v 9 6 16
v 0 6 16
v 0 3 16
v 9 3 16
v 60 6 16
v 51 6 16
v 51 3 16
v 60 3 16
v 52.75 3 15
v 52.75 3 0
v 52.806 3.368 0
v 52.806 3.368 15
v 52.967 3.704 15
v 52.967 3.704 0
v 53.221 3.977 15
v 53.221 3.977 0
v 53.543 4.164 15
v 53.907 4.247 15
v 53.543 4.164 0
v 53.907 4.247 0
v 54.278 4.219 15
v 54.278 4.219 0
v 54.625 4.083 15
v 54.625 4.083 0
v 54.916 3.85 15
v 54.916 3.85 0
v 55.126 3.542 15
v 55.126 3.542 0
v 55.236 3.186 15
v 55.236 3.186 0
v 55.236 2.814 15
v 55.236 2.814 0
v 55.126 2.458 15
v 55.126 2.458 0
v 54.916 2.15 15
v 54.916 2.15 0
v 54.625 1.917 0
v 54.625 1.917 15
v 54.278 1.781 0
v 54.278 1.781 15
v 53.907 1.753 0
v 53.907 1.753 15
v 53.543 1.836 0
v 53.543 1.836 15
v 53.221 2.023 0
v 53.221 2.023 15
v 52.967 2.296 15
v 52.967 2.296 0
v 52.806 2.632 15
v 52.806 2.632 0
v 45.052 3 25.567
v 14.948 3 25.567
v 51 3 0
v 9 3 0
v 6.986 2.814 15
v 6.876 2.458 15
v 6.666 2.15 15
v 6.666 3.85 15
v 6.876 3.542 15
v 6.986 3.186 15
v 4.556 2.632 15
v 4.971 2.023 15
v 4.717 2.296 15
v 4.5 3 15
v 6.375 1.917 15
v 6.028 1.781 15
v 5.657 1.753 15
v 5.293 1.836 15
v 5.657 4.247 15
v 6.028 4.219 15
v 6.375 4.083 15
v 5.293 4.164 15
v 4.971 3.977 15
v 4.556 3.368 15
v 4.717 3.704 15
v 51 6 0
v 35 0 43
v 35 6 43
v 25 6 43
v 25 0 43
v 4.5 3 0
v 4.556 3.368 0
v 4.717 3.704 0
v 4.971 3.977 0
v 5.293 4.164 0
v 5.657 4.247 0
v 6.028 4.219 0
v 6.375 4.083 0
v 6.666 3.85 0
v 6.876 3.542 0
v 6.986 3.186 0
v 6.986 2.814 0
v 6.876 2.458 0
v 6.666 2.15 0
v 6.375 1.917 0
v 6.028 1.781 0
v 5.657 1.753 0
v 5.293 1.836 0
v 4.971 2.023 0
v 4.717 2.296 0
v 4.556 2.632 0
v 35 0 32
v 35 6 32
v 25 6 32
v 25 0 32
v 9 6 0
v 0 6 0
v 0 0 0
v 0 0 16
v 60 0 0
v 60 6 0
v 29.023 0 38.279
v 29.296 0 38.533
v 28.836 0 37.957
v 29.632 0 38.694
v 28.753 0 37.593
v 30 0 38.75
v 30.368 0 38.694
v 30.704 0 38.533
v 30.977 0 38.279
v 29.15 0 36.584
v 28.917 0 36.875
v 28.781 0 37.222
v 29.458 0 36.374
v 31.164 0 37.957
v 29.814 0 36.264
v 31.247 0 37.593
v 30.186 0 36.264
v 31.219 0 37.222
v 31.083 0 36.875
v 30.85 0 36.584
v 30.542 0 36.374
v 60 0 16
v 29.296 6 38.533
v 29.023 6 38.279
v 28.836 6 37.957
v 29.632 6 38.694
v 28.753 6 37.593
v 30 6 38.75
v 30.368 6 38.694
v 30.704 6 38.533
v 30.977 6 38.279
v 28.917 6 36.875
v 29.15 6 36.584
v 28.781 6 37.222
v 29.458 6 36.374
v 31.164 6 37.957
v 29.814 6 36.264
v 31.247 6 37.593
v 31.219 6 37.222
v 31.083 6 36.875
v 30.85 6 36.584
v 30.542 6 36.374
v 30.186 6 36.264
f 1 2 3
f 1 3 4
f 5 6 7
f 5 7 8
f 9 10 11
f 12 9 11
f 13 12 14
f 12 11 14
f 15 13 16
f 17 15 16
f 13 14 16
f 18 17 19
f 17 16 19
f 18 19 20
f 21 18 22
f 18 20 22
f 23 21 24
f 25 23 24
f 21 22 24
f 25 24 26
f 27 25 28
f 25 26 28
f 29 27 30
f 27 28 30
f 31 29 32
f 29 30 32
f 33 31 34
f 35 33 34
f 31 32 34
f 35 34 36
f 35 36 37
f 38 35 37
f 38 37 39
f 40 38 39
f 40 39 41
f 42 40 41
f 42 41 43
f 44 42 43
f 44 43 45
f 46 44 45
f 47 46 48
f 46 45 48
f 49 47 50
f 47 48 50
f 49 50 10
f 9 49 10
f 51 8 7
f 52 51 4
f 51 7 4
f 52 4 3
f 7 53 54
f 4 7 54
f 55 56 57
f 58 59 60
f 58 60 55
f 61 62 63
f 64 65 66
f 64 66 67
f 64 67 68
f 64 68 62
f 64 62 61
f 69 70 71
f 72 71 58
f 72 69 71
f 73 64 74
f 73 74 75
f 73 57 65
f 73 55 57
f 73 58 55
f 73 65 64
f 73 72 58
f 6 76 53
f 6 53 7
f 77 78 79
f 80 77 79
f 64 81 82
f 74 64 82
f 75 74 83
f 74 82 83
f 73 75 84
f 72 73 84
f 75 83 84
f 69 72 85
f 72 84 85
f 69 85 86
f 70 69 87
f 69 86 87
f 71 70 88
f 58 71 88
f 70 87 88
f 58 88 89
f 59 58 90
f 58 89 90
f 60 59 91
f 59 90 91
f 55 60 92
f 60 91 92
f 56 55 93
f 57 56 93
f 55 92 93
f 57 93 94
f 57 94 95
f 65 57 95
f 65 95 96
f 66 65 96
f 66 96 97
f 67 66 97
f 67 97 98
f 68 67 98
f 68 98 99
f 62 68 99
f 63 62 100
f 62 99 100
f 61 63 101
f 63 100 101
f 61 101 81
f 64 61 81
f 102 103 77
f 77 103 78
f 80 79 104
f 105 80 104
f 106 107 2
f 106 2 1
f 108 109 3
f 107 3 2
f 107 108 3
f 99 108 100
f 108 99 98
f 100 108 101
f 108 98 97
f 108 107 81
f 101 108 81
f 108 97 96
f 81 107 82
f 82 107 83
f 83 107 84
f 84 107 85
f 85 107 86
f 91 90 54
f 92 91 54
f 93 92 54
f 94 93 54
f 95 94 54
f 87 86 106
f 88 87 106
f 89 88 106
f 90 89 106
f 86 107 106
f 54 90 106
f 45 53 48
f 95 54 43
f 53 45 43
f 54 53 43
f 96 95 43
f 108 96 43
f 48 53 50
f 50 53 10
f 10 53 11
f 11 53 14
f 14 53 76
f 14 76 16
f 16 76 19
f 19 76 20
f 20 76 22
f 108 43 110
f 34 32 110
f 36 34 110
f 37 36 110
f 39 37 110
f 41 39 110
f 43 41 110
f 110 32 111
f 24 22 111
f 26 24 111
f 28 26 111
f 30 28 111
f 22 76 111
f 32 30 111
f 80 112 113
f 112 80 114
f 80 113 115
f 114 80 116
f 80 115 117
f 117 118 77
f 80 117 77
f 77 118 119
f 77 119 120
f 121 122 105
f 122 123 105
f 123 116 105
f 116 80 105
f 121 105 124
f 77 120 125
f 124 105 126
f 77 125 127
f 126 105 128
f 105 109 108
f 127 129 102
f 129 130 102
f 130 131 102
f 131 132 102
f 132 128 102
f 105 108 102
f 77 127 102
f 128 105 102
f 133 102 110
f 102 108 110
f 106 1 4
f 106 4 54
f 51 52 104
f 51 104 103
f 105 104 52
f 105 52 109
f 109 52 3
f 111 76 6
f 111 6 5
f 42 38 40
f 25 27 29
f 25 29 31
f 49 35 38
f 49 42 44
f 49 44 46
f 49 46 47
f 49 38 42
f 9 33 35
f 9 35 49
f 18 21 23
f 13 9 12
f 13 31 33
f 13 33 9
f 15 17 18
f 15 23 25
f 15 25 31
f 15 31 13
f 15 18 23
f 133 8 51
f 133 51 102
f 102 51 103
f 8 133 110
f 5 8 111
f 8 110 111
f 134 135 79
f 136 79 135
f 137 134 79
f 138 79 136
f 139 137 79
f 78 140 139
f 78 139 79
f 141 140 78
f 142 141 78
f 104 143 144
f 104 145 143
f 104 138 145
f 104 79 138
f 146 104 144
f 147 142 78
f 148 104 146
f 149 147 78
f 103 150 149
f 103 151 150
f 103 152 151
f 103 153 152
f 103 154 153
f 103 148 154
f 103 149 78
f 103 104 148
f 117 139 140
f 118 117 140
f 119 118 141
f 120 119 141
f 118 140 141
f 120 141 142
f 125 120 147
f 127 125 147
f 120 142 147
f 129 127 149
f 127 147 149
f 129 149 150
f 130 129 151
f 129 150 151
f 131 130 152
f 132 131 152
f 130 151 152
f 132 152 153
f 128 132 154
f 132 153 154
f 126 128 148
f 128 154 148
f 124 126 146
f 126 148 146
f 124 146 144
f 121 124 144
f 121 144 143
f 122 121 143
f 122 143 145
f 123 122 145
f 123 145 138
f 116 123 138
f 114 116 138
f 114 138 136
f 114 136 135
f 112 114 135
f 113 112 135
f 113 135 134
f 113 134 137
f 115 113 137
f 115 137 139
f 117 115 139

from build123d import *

# Parameters (mm, degrees)
ESQUISSE1_W             = 60
ESQUISSE1_H             = 6
BOSS_EXTRU_1_DEPTH      = 60
ESQUISSE2_R             = 1.25
ENL_V_MAT_EXTRU_1_DEPTH = 15
ESQUISSE3_R             = 1.25
ENL_V_MAT_EXTRU_2_DEPTH = 15
ESQUISSE4_W             = 10
ESQUISSE4_H             = 11
ENL_V_MAT_EXTRU_3_DEPTH = 3
ENL_V_MAT_EXTRU_4_DEPTH = 52
CHANFREIN1_SIZE2        = 6.433520762
CHANFREIN1_SIZE         = 3


with BuildPart() as part:
    # Esquisse1 → Boss.-Extru.1 (new body)
    with BuildSketch(Plane.XY):
        with Locations((30, 3)):
            Rectangle(ESQUISSE1_W, ESQUISSE1_H)
    extrude(amount=BOSS_EXTRU_1_DEPTH)

    # Esquisse2 → Enlèv. mat.-Extru.1 (cut)
    with BuildSketch(Plane(origin=(0, 0, 0), x_dir=(-1, 0, 0), z_dir=(0, 0, -1))):
        with Locations((-54, 3)):
            Circle(ESQUISSE2_R)
        with Locations((-5.75, 3)):
            Circle(ESQUISSE2_R)
    extrude(amount=-ENL_V_MAT_EXTRU_1_DEPTH, mode=Mode.SUBTRACT)

    # Esquisse3 → Enlèv. mat.-Extru.2 (cut)
    with BuildSketch(Plane(origin=(0, 6, 0), x_dir=(1, 0, 0), z_dir=(0, 1, 0))):
        with Locations(Location((30, -37.5, 0), (0, 0, 270))):
            Circle(ESQUISSE3_R)
    extrude(amount=-ENL_V_MAT_EXTRU_2_DEPTH, mode=Mode.SUBTRACT)

    # Esquisse4 → Enlèv. mat.-Extru.3 (cut)
    with BuildSketch(Plane(origin=(0, 6, 0), x_dir=(1, 0, 0), z_dir=(0, 1, 0))):
        Polygon((0, -16), (9, -16), (9, 0), (51, 0), (51, -16), (60, -16), (60, -60), (0, -60), align=None)
        with Locations((30, -37.5)):
            Rectangle(ESQUISSE4_W, ESQUISSE4_H, mode=Mode.SUBTRACT)
    extrude(amount=-ENL_V_MAT_EXTRU_3_DEPTH, mode=Mode.SUBTRACT)

    # Esquisse5 → Enlèv. mat.-Extru.4 (cut)
    with BuildSketch(Plane(origin=(0, 3, 0), x_dir=(1, 0, 0), z_dir=(0, 1, 0))):
        Polygon((60, -16), (35, -32), (35, -43), (25, -43), (25, -32), (0, -16), (-21.594855386, -85.475485762), (75.414479662, -69.930764824), align=None)
    extrude(amount=-ENL_V_MAT_EXTRU_4_DEPTH, mode=Mode.SUBTRACT)

    # Chanfrein1
    chanfrein1_edges = [part.edges().sort_by_distance(p)[0] for p in [
        (30, 3, 32),
    ]]
    chanfrein1_side = [part.faces().sort_by_distance(p)[0] for p in [
        (30, 3.06, 32),
    ]]
    chamfer(chanfrein1_edges, length=CHANFREIN1_SIZE - 0.0001, length2=CHANFREIN1_SIZE2 - 0.0001, reference=chanfrein1_side[0])  # a hair under: the kernel refuses the full size


solid = part.part
